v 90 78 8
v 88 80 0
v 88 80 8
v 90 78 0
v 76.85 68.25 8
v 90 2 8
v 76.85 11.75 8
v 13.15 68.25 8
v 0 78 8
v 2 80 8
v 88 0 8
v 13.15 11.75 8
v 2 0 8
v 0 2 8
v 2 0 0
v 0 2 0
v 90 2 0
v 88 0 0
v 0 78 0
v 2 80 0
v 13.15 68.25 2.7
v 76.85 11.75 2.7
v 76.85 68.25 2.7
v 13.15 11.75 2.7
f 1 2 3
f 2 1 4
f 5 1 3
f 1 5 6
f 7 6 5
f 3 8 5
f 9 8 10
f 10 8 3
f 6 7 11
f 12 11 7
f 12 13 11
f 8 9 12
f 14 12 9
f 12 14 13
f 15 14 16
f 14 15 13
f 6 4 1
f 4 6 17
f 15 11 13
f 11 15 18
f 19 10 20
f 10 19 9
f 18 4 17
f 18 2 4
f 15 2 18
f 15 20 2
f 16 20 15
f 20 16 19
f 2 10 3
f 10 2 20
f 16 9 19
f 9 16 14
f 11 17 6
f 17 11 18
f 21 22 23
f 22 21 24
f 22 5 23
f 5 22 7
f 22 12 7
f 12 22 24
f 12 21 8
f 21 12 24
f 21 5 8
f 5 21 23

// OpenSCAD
$fn = 32;

// ----------------------------------------------------------------------
// Windowed plate: 1 voids, 90 x 80 x 8 mm
// ----------------------------------------------------------------------

// --- parameters (mm) ---
plate_l = 90;             // plate length, X
plate_w = 80;             // plate width, Y
plate_t = 8;              // plate thickness, Z
edge_margin = 8;          // wall from the plate edge to any window
win1_l = 63.7;            // window length
win1_w = 56.5;            // window width
depth_1 = 5.3;            // depth of void 1 (full thickness = through)
corner_c = 2;             // corner chamfer of the plate

profile = [[2, 0], [88, 0], [90, 2], [90, 78], [88, 80], [2, 80], [0, 78], [0, 2]];  // primary outline, 8 points, counter clockwise
void_1 = [[13.15, 11.75], [76.85, 11.75], [76.85, 68.25], [13.15, 68.25]];  // large central window, 4 points

// --- the one profile operation ---
difference() {
  linear_extrude(height = plate_t) polygon(points = profile);
  translate([0, 0, plate_t - depth_1])
    linear_extrude(height = depth_1 + 1) polygon(points = void_1);
}
